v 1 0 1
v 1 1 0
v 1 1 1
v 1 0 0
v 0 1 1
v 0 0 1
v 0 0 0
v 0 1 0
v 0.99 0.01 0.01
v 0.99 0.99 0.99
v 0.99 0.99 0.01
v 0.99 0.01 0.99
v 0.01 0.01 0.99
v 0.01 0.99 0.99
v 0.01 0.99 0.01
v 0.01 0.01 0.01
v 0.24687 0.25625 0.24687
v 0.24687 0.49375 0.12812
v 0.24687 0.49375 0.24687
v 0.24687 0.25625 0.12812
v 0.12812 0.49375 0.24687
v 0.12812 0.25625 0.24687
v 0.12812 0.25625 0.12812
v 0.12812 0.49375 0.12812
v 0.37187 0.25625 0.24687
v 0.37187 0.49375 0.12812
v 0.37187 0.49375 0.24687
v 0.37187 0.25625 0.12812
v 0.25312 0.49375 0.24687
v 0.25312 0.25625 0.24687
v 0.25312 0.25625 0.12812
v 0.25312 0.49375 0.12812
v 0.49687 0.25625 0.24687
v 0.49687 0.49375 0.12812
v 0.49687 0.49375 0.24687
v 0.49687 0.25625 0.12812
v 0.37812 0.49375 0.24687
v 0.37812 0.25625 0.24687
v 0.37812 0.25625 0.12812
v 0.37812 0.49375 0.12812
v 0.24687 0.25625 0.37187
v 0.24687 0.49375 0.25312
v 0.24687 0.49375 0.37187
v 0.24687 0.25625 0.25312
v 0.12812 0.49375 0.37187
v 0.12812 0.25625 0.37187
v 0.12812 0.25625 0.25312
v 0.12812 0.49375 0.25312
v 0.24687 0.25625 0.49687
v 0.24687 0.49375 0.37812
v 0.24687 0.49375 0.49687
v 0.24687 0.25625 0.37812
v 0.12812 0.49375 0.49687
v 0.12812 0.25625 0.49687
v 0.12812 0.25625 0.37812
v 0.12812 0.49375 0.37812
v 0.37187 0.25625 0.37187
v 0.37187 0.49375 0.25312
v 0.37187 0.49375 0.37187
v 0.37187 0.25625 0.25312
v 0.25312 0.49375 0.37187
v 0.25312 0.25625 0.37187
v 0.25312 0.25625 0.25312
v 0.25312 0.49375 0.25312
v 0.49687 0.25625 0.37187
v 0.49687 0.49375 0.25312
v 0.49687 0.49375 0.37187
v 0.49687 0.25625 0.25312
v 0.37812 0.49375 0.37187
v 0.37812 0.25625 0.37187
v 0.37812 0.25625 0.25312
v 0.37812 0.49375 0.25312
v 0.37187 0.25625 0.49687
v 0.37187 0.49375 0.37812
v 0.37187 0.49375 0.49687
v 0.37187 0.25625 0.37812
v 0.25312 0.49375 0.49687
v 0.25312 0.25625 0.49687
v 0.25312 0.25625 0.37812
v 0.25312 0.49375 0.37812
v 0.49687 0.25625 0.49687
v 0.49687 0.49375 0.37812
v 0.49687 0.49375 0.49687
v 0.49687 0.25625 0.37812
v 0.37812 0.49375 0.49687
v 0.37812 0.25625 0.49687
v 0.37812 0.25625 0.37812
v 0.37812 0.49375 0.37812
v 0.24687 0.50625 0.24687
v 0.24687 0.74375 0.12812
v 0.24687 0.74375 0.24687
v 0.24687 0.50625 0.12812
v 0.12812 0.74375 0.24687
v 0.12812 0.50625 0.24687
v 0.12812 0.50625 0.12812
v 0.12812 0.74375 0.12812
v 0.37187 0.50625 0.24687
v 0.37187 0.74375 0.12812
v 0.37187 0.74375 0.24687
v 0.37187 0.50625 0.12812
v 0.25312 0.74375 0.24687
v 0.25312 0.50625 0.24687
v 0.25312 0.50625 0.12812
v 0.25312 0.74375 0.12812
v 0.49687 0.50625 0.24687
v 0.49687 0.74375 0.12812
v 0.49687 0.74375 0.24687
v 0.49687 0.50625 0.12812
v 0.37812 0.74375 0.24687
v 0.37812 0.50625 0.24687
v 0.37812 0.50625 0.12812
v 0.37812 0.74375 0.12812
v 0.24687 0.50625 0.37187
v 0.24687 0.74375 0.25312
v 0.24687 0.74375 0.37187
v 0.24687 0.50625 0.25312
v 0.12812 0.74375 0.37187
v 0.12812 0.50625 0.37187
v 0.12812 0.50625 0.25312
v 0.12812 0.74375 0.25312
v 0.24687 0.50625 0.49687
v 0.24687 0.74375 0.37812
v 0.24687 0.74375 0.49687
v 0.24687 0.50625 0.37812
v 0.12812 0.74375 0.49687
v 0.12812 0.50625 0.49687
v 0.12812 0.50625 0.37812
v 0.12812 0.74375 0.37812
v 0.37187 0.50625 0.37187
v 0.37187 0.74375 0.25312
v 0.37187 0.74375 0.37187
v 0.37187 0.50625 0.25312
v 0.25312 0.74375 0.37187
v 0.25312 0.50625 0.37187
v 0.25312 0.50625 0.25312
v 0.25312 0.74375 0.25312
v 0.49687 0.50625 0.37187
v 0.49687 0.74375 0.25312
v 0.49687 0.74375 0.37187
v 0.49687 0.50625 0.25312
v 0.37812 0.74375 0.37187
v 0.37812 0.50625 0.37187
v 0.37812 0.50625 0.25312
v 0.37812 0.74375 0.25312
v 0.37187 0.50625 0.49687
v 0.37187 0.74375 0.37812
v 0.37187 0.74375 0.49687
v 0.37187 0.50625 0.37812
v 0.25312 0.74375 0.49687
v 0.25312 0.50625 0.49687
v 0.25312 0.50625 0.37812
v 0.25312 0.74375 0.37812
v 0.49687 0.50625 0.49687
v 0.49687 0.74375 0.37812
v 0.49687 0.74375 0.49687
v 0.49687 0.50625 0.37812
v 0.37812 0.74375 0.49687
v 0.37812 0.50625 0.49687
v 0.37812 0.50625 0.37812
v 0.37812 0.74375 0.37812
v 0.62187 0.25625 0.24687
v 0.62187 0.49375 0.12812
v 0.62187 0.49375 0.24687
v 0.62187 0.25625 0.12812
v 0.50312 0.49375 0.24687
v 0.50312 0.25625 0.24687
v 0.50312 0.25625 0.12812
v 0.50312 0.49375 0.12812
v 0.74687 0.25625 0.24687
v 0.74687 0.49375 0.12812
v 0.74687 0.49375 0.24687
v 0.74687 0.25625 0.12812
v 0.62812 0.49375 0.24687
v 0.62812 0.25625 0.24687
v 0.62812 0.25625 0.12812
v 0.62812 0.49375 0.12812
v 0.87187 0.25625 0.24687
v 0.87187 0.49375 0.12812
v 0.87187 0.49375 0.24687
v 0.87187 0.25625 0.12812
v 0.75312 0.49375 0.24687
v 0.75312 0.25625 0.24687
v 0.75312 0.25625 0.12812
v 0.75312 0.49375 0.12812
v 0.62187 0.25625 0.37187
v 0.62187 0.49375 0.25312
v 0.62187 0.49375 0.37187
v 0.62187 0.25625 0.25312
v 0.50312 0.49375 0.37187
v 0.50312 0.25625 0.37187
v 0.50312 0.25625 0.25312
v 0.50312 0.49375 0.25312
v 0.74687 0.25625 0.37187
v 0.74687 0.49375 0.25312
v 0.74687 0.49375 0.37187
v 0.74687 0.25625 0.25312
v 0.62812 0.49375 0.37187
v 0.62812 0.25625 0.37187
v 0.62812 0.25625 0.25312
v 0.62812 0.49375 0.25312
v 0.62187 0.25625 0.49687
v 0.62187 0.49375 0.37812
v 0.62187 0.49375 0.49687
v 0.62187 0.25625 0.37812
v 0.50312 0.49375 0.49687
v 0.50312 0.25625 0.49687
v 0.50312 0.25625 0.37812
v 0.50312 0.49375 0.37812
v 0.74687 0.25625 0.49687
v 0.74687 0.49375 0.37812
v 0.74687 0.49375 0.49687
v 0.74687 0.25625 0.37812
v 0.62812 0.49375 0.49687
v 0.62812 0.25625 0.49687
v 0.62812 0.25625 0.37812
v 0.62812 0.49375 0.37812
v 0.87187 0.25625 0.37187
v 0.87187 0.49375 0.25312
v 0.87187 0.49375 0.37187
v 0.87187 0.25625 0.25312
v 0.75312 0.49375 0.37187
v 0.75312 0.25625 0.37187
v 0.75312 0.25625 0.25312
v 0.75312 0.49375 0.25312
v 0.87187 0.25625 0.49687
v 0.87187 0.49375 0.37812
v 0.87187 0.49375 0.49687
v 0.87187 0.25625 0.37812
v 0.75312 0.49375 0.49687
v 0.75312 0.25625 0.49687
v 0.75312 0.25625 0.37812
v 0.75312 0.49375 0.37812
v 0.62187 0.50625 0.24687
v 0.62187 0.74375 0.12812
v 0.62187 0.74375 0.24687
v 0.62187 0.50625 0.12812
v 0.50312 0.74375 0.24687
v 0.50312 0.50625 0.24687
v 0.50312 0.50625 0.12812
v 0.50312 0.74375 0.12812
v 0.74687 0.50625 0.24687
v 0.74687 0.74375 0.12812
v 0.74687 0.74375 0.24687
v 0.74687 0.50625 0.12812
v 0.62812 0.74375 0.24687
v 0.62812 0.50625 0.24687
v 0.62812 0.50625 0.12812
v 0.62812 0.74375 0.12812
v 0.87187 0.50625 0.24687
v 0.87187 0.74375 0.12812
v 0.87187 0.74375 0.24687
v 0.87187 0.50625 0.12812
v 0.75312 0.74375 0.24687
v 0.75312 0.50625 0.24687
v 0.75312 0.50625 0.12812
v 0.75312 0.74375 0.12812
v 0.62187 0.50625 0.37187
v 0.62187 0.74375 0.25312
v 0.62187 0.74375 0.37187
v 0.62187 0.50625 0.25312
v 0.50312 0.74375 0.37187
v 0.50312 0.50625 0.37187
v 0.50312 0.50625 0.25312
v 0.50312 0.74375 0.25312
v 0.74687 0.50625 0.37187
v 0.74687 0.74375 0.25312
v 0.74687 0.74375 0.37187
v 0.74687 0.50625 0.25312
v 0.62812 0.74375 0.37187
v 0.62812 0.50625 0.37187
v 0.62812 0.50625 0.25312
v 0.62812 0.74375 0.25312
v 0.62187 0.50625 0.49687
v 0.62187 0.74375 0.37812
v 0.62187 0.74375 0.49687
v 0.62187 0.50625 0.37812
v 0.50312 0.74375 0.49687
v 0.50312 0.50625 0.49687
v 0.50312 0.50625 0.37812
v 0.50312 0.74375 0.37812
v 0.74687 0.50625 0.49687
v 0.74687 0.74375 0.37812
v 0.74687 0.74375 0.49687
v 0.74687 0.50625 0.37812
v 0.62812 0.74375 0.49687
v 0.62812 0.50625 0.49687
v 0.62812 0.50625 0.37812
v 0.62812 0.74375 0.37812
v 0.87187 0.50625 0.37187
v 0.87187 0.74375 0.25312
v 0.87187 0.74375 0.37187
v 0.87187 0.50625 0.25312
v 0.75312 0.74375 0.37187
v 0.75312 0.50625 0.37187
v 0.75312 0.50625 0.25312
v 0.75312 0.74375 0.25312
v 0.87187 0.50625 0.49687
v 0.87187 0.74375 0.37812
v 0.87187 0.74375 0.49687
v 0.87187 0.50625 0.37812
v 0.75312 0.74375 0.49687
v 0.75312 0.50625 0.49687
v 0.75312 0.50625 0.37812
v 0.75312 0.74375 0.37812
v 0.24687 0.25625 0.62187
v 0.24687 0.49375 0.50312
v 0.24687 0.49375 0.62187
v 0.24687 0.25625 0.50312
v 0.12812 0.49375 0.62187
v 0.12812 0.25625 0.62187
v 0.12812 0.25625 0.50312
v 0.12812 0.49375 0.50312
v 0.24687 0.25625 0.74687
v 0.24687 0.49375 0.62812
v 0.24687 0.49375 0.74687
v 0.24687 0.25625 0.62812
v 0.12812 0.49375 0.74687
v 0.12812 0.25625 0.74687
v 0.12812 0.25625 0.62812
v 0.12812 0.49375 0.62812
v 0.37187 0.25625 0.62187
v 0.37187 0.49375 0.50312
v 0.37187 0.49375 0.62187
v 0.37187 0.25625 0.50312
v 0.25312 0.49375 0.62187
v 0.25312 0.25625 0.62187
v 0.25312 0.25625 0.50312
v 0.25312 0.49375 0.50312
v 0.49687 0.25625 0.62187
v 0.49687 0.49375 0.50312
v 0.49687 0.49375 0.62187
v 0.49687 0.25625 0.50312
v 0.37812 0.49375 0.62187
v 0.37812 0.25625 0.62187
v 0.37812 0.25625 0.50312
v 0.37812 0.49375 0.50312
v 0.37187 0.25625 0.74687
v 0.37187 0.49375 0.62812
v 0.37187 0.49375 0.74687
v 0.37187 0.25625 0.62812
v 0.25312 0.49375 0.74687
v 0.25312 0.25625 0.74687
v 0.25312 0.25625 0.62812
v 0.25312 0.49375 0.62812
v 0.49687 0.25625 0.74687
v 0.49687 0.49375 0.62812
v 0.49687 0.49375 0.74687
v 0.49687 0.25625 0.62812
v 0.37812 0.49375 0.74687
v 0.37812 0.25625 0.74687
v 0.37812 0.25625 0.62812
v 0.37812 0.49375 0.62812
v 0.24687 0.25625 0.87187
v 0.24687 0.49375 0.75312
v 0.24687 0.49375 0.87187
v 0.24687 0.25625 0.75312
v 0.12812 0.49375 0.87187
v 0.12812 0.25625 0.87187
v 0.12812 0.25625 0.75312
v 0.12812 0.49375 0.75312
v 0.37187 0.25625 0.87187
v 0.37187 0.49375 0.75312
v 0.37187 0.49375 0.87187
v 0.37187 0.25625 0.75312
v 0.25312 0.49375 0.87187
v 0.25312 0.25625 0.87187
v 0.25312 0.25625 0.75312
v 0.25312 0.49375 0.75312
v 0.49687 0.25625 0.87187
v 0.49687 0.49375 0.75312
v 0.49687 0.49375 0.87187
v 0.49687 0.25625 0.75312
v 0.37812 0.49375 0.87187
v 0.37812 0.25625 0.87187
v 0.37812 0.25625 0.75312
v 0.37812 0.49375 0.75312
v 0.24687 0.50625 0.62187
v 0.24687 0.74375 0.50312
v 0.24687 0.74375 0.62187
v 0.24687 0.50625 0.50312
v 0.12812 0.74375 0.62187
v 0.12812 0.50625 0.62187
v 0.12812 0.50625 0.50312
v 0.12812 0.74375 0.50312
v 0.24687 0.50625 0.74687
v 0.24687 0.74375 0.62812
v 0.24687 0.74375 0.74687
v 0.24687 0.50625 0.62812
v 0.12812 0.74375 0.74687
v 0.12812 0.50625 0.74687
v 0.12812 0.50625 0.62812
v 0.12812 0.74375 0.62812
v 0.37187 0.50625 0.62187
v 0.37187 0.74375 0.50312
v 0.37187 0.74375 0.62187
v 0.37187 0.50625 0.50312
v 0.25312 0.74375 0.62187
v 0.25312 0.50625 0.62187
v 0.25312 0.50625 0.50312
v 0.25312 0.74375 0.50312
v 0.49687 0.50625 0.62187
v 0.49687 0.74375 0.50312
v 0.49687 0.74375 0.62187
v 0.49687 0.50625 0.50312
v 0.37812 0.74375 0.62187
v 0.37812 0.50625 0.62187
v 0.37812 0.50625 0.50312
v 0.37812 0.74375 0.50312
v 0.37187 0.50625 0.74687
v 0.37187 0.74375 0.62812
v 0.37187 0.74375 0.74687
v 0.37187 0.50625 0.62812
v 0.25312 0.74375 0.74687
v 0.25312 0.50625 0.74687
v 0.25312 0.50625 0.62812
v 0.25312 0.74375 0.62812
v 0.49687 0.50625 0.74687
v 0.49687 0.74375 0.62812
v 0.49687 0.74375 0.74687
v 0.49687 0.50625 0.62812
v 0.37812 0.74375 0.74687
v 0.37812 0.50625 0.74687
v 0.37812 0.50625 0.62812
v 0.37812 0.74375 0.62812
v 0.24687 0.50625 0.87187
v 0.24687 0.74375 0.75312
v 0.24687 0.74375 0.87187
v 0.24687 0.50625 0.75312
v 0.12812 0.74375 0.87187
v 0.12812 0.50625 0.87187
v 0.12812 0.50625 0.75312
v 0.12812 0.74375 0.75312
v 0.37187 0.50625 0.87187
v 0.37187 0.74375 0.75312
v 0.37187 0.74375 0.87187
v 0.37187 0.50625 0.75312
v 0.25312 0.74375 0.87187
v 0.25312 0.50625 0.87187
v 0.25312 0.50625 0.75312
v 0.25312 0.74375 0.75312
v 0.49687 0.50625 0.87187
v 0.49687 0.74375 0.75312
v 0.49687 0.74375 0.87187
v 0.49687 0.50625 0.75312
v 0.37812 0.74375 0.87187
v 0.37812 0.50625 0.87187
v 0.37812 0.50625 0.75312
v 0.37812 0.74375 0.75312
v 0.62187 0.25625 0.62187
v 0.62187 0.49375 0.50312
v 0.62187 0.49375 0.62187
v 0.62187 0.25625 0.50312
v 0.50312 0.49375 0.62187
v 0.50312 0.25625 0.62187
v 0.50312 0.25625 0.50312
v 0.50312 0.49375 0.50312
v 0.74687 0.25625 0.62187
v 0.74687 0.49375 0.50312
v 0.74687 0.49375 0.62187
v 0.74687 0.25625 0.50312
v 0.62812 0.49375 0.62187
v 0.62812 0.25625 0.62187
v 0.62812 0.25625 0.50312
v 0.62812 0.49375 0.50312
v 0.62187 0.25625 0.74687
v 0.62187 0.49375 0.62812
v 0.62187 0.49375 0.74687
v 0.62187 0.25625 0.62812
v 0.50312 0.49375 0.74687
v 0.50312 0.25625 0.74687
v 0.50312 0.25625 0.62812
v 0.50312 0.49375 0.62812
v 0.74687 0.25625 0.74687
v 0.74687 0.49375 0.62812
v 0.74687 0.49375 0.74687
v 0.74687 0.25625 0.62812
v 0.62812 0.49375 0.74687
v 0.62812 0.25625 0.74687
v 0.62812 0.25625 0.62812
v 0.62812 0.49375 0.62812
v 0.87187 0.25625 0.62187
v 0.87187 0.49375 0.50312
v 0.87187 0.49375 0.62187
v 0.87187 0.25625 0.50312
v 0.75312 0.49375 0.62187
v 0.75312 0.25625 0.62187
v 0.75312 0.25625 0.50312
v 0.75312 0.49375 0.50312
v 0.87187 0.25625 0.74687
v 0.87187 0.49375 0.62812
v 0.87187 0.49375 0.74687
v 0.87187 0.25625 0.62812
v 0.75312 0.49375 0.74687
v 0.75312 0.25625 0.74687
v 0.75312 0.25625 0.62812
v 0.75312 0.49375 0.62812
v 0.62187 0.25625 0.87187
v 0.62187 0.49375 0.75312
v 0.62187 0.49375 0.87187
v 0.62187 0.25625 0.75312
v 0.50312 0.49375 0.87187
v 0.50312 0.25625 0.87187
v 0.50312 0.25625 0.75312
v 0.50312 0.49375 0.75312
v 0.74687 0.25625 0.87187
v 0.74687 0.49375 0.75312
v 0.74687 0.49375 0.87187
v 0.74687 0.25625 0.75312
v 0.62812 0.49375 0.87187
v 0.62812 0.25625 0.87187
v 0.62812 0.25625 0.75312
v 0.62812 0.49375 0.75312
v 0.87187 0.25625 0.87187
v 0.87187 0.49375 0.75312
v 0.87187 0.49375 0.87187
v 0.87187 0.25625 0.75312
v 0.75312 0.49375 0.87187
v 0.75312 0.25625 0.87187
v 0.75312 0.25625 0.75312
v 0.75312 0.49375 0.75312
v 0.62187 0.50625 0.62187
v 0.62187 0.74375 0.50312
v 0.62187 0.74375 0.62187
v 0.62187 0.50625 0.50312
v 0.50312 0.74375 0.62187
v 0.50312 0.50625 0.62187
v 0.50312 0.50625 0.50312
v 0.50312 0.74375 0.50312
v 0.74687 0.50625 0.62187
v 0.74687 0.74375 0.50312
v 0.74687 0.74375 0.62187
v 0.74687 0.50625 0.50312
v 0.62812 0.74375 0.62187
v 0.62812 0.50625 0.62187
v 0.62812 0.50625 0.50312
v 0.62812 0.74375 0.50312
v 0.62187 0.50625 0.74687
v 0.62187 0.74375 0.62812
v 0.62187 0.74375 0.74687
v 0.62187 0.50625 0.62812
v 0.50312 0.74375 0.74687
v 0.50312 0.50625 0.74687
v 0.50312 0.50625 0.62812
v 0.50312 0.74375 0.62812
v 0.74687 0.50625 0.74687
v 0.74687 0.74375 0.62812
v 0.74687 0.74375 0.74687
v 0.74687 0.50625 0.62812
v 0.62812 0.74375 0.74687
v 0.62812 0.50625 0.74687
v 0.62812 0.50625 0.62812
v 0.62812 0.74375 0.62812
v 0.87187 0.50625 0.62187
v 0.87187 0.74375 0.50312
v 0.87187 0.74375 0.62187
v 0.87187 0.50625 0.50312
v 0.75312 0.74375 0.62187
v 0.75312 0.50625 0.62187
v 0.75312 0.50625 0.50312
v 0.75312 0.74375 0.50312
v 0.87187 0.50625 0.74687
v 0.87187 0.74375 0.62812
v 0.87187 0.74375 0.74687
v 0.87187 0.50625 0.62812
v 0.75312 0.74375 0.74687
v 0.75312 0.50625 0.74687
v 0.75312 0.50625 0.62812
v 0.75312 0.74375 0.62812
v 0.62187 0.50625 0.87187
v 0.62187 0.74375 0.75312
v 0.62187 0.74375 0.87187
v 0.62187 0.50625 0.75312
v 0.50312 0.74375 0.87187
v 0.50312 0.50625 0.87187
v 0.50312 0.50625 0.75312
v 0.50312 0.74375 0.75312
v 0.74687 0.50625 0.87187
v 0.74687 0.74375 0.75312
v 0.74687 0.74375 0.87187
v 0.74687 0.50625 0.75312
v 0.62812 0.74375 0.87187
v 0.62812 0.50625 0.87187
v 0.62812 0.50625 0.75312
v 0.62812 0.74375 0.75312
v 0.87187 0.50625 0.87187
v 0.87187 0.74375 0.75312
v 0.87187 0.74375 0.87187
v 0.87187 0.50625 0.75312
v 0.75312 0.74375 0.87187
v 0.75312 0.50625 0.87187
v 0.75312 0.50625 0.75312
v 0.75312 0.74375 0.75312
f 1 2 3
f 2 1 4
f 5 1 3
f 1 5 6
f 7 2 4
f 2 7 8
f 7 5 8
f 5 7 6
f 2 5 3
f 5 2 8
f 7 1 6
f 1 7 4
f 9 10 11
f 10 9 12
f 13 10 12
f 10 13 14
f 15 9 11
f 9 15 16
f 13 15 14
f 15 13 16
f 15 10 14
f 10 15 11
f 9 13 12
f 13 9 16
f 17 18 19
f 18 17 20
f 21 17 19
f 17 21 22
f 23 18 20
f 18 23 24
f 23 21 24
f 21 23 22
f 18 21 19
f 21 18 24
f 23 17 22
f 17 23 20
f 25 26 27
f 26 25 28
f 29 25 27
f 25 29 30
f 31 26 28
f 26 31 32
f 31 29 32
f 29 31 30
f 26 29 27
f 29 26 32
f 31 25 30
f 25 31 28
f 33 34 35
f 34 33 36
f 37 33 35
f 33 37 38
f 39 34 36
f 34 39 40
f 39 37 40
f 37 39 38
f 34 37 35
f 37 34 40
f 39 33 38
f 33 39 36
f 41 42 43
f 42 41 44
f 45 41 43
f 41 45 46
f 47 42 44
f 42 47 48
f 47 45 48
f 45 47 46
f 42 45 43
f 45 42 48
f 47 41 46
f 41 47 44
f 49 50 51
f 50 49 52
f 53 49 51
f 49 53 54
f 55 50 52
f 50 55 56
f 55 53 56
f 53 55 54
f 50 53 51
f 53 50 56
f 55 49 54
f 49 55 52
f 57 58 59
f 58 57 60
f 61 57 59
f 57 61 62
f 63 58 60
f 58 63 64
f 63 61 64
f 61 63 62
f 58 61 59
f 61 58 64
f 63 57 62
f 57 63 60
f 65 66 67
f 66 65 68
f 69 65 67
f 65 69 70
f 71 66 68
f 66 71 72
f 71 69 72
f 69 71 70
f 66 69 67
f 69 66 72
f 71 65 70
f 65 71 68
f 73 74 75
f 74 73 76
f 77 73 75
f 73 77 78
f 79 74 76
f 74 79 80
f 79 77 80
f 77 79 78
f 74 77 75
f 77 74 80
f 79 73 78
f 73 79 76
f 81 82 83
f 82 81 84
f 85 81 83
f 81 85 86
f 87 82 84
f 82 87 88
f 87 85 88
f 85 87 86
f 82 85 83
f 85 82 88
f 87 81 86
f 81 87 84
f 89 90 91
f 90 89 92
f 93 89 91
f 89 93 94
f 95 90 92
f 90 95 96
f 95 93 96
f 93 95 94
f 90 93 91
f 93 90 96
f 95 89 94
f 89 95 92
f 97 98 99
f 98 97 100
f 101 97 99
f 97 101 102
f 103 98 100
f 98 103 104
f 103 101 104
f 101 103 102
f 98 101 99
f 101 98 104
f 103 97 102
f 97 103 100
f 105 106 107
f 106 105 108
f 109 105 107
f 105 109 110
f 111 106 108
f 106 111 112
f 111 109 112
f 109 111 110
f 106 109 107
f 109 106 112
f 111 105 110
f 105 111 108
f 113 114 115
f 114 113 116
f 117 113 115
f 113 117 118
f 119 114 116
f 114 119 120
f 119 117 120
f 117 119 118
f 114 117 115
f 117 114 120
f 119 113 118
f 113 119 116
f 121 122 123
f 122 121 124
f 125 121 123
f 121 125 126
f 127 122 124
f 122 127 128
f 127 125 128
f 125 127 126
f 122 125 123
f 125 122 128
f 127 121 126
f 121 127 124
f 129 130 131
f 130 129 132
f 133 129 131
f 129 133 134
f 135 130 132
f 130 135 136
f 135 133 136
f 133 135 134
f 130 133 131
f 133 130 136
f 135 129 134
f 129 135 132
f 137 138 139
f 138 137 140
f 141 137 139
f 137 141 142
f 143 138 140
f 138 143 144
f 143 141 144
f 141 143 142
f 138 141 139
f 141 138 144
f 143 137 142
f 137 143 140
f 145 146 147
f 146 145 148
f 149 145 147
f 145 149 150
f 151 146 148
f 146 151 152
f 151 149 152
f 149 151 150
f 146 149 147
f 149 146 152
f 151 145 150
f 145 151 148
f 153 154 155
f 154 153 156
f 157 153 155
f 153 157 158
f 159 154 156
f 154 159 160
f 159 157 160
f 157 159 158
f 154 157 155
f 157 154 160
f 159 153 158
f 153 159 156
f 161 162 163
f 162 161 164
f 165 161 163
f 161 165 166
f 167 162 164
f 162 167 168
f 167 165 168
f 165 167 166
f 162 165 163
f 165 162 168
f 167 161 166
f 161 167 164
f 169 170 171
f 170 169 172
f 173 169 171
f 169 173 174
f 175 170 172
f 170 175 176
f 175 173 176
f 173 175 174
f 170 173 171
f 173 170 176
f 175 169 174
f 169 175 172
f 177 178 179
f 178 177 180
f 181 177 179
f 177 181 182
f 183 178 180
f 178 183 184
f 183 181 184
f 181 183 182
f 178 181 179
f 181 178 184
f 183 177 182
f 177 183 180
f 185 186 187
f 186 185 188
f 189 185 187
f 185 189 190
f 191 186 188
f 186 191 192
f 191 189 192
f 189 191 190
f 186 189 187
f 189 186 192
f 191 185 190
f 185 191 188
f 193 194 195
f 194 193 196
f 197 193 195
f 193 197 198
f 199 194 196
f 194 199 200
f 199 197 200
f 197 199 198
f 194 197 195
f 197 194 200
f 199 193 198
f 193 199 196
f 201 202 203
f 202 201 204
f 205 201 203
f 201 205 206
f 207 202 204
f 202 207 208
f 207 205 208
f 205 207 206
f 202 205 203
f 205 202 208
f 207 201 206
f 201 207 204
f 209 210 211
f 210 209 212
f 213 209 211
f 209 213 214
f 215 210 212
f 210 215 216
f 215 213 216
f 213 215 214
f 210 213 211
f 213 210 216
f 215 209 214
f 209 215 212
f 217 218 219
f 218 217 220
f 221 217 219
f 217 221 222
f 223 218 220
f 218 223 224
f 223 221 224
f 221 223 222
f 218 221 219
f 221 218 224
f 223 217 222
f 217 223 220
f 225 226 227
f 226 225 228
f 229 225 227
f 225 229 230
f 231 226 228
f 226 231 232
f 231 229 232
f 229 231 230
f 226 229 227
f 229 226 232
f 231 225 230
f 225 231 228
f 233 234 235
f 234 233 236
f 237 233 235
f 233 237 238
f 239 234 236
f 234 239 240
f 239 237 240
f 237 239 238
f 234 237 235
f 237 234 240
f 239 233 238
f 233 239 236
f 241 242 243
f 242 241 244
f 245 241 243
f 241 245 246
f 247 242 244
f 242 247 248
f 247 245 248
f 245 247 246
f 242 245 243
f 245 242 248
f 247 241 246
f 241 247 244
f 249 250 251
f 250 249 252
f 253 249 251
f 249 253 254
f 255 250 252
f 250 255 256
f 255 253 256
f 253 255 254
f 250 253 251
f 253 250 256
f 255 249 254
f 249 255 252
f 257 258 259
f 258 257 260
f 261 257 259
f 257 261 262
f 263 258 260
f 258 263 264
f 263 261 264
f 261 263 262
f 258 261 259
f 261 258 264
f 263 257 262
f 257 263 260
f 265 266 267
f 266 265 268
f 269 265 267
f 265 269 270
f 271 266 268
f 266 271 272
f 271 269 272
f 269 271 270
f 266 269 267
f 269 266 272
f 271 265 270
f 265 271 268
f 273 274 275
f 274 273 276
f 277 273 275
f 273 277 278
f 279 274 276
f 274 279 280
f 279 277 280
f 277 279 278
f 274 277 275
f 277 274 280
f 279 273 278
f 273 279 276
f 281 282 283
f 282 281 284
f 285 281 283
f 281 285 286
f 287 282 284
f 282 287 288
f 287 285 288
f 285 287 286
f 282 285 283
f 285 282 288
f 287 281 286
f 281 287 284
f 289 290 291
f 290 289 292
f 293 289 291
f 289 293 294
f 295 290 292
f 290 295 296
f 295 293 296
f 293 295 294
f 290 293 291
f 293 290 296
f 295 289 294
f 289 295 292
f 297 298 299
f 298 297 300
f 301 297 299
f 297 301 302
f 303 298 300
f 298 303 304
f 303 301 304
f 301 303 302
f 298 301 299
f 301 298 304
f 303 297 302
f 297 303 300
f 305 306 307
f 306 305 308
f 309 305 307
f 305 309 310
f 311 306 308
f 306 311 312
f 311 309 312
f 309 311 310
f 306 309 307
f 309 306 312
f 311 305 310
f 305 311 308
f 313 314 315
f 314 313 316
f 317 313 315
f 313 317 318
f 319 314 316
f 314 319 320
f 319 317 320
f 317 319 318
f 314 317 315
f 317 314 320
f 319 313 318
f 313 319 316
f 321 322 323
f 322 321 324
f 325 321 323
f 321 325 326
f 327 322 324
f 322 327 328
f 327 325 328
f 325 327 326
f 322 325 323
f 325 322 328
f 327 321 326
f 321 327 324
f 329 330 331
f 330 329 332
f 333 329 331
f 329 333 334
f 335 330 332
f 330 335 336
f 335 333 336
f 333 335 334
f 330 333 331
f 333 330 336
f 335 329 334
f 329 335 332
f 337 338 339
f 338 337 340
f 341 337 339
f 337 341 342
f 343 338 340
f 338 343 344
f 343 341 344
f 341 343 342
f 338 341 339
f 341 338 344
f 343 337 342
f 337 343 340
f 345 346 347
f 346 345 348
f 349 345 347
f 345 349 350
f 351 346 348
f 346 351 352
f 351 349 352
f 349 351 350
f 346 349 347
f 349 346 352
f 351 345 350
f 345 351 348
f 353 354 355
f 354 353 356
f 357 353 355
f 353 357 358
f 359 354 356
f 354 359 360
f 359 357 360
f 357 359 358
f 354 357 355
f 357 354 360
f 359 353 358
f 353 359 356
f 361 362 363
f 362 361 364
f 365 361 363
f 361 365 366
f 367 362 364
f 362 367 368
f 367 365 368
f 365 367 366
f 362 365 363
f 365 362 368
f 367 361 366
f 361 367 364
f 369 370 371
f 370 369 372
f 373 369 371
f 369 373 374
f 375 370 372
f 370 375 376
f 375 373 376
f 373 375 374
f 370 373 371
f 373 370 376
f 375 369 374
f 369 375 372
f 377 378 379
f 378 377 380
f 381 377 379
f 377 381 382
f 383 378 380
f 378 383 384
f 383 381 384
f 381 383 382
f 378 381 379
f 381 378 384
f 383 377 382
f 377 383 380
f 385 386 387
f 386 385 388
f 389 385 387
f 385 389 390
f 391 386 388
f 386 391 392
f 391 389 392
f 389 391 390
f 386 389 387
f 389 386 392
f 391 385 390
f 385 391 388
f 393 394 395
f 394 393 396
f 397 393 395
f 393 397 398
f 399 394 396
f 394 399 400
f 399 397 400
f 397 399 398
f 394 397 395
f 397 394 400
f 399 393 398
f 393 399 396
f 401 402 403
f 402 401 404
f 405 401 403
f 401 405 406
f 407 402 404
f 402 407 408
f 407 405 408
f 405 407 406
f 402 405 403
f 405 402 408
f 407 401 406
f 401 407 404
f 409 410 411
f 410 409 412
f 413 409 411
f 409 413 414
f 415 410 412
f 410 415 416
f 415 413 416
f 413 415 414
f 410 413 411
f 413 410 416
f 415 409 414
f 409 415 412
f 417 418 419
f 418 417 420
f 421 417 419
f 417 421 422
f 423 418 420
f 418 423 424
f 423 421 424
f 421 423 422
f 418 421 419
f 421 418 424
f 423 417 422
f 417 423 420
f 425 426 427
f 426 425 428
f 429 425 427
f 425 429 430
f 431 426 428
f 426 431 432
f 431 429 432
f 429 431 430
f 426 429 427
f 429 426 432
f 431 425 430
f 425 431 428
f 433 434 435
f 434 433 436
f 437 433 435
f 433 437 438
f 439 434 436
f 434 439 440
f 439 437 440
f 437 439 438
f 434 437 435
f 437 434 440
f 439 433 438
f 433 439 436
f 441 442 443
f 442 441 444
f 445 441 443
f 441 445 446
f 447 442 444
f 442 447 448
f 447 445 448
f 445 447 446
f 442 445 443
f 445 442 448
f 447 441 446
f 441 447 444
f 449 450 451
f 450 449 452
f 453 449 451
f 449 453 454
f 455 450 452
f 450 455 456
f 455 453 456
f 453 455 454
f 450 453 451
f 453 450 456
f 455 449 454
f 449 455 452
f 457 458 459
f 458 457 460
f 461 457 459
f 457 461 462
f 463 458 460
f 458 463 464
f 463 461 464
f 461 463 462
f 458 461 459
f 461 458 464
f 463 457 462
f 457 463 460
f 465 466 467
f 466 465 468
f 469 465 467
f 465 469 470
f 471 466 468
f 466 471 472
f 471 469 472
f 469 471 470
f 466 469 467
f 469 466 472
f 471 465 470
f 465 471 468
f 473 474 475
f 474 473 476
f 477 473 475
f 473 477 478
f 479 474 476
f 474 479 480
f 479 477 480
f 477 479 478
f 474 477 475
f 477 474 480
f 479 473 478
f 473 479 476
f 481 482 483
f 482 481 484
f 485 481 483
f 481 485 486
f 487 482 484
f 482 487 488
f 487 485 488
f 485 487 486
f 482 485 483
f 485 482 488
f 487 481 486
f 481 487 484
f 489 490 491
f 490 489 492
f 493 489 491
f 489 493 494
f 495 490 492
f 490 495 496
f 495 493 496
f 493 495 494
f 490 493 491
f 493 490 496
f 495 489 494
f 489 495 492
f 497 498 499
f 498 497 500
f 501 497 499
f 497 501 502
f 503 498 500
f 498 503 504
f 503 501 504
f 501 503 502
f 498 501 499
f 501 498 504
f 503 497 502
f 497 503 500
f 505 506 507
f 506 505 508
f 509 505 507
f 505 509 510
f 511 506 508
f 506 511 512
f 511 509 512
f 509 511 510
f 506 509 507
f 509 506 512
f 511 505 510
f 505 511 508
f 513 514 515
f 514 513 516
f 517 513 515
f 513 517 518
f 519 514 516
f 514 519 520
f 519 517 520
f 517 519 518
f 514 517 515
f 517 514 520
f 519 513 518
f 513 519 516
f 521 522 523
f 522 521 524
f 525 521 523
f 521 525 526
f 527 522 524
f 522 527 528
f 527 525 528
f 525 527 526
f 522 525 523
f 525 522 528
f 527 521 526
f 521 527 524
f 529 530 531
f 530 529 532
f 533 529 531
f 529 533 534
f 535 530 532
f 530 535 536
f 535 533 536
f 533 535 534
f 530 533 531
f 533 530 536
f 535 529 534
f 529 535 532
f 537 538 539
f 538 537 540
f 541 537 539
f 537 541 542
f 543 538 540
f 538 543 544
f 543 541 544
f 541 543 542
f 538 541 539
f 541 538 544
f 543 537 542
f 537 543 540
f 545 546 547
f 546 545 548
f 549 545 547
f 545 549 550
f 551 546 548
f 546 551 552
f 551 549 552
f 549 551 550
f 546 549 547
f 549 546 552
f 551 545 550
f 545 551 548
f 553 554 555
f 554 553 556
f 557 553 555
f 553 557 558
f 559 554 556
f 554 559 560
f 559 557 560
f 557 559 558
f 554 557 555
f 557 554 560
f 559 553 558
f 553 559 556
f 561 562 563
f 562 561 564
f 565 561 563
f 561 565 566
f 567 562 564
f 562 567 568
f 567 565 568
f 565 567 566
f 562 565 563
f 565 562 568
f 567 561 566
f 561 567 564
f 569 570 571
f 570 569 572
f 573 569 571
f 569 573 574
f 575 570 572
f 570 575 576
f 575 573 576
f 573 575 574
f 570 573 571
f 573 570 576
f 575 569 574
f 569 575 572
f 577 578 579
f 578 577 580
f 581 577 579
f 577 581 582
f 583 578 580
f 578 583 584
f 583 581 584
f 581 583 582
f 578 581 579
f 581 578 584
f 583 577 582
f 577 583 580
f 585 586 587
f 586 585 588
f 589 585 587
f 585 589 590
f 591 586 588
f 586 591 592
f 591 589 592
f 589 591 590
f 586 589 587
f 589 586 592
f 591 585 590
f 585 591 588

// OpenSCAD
translate([0.1875, 0.375, 0.1875]) color([0.4027663718100136, 0.6577212462700855, 0.6898864362311222]) cube([0.11875, 0.2375, 0.11875], center=true);
translate([0.3125, 0.375, 0.1875]) color([0.9054447882857072, 0.7509014738189853, 0.1895263609282205]) cube([0.11875, 0.2375, 0.11875], center=true);
translate([0.4375, 0.375, 0.1875]) color([0.45596485047959523, 0.8783351779475488, 0.4538518730840495]) cube([0.11875, 0.2375, 0.11875], center=true);
translate([0.1875, 0.375, 0.3125]) color([0.392660976888327, 0.856988482484495, 0.6201647902220953]) cube([0.11875, 0.2375, 0.11875], center=true);
translate([0.1875, 0.375, 0.4375]) color([0.29061826466264573, 0.962227894906525, 0.8675314723906767]) cube([0.11875, 0.2375, 0.11875], center=true);
translate([0.3125, 0.375, 0.3125]) color([0.8803060724684076, 0.8138480179101812, 0.7400092052970599]) cube([0.11875, 0.2375, 0.11875], center=true);
translate([0.4375, 0.375, 0.3125]) color([0.5394445544845855, 0.5760594201823124, 0.5958853169652069]) cube([0.11875, 0.2375, 0.11875], center=true);
translate([0.3125, 0.375, 0.4375]) color([0.9765395534020428, 0.1829668899751793, 0.7537025803929293]) cube([0.11875, 0.2375, 0.11875], center=true);
translate([0.4375, 0.375, 0.4375]) color([0.6030052593528492, 0.2876412521642051, 0.6348976512769944]) cube([0.11875, 0.2375, 0.11875], center=true);
translate([0.1875, 0.625, 0.1875]) color([0.7277197744124063, 0.35444110935932793, 0.13099720777835244]) cube([0.11875, 0.2375, 0.11875], center=true);
translate([0.3125, 0.625, 0.1875]) color([0.4028586833174501, 0.6909489908116095, 0.5046977059005883]) cube([0.11875, 0.2375, 0.11875], center=true);
translate([0.4375, 0.625, 0.1875]) color([0.9629492600241728, 0.26191874219651334, 0.04834033943485738]) cube([0.11875, 0.2375, 0.11875], center=true);
translate([0.1875, 0.625, 0.3125]) color([0.45923032237186845, 0.009528131294201714, 0.502466895235334]) cube([0.11875, 0.2375, 0.11875], center=true);
translate([0.1875, 0.625, 0.4375]) color([0.28668854888236694, 0.691988813393134, 0.7039243500182285]) cube([0.11875, 0.2375, 0.11875], center=true);
translate([0.3125, 0.625, 0.3125]) color([0.6909228597729594, 0.6425067308098993, 0.8260971072391406]) cube([0.11875, 0.2375, 0.11875], center=true);
translate([0.4375, 0.625, 0.3125]) color([0.9493344595797667, 0.3534564548141357, 0.5797180935726473]) cube([0.11875, 0.2375, 0.11875], center=true);
translate([0.3125, 0.625, 0.4375]) color([0.7810705573282835, 0.2844853183364905, 0.2538937908972332]) cube([0.11875, 0.2375, 0.11875], center=true);
translate([0.4375, 0.625, 0.4375]) color([0.5787285323695237, 0.11539312184696959, 0.8023856460035432]) cube([0.11875, 0.2375, 0.11875], center=true);
translate([0.5625, 0.375, 0.1875]) color([0.21861457317165833, 0.8676945440438885, 0.5076736037058898]) cube([0.11875, 0.2375, 0.11875], center=true);
translate([0.6875, 0.375, 0.1875]) color([0.7138499686467532, 0.22713272906273496, 0.19390251356413268]) cube([0.11875, 0.2375, 0.11875], center=true);
translate([0.8125, 0.375, 0.1875]) color([0.8240740032726942, 0.6733086943972952, 0.42782145262094673]) cube([0.11875, 0.2375, 0.11875], center=true);
translate([0.5625, 0.375, 0.3125]) color([0.8852650888181466, 0.06739856337172401, 0.6884111402324574]) cube([0.11875, 0.2375, 0.11875], center=true);
translate([0.6875, 0.375, 0.3125]) color([0.9973030967892196, 0.7409370940146432, 0.06492133544831458]) cube([0.11875, 0.2375, 0.11875], center=true);
translate([0.5625, 0.375, 0.4375]) color([0.7942364824350366, 0.3053909315102985, 0.8216686663682834]) cube([0.11875, 0.2375, 0.11875], center=true);
translate([0.6875, 0.375, 0.4375]) color([0.8459339369028931, 0.10292352286401718, 0.3596183375652757]) cube([0.11875, 0.2375, 0.11875], center=true);
translate([0.8125, 0.375, 0.3125]) color([0.09283318422206643, 0.1574888597405516, 0.05329512929812119]) cube([0.11875, 0.2375, 0.11875], center=true);
translate([0.8125, 0.375, 0.4375]) color([0.2699146760255431, 0.04789901746797298, 0.5311955905083697]) cube([0.11875, 0.2375, 0.11875], center=true);
translate([0.5625, 0.625, 0.1875]) color([0.6347236326985357, 0.22194381133175534, 0.7589835239916253]) cube([0.11875, 0.2375, 0.11875], center=true);
translate([0.6875, 0.625, 0.1875]) color([0.6022590362463128, 0.030652426287076096, 0.2834486040351434]) cube([0.11875, 0.2375, 0.11875], center=true);
translate([0.8125, 0.625, 0.1875]) color([0.1619511803560364, 0.5865516376320478, 0.8828126406174278]) cube([0.11875, 0.2375, 0.11875], center=true);
translate([0.5625, 0.625, 0.3125]) color([0.39153967851812266, 0.7185326387678173, 0.23053015786512054]) cube([0.11875, 0.2375, 0.11875], center=true);
translate([0.6875, 0.625, 0.3125]) color([0.982870030008995, 0.9702944368690501, 0.24195708671592953]) cube([0.11875, 0.2375, 0.11875], center=true);
translate([0.5625, 0.625, 0.4375]) color([0.704495028087497, 0.5155786783081866, 0.561419053309271]) cube([0.11875, 0.2375, 0.11875], center=true);
translate([0.6875, 0.625, 0.4375]) color([0.5923741296225379, 0.9857567098878326, 0.9164117351002967]) cube([0.11875, 0.2375, 0.11875], center=true);
translate([0.8125, 0.625, 0.3125]) color([0.8116019260161097, 0.5883866289782574, 0.33879660324831606]) cube([0.11875, 0.2375, 0.11875], center=true);
translate([0.8125, 0.625, 0.4375]) color([0.8056081572624008, 0.6883259942275256, 0.6442271513792995]) cube([0.11875, 0.2375, 0.11875], center=true);
translate([0.1875, 0.375, 0.5625]) color([0.8431767362036547, 0.8108980259618639, 0.6405391435643338]) cube([0.11875, 0.2375, 0.11875], center=true);
translate([0.1875, 0.375, 0.6875]) color([0.685920749167404, 0.2509693260364446, 0.15500232486790055]) cube([0.11875, 0.2375, 0.11875], center=true);
translate([0.3125, 0.375, 0.5625]) color([0.46926577374890555, 0.16609469683297173, 0.4224585519841333]) cube([0.11875, 0.2375, 0.11875], center=true);
translate([0.4375, 0.375, 0.5625]) color([0.2490168900491534, 0.40880502569295185, 0.012419103072644377]) cube([0.11875, 0.2375, 0.11875], center=true);
translate([0.3125, 0.375, 0.6875]) color([0.025875812278519095, 0.7873495565870041, 0.9759359006867971]) cube([0.11875, 0.2375, 0.11875], center=true);
translate([0.4375, 0.375, 0.6875]) color([0.04370132643842428, 0.0680748917335321, 0.10993484573778345]) cube([0.11875, 0.2375, 0.11875], center=true);
translate([0.1875, 0.375, 0.8125]) color([0.025440652526324325, 0.35930918769587816, 0.6576834209110304]) cube([0.11875, 0.2375, 0.11875], center=true);
translate([0.3125, 0.375, 0.8125]) color([0.45738792513705007, 0.11050016433501875, 0.16934144419549657]) cube([0.11875, 0.2375, 0.11875], center=true);
translate([0.4375, 0.375, 0.8125]) color([0.9823307052955691, 0.015371616596600357, 0.5469958681368476]) cube([0.11875, 0.2375, 0.11875], center=true);
translate([0.1875, 0.625, 0.5625]) color([0.4481673411531317, 0.39564673043400334, 0.44744174271207393]) cube([0.11875, 0.2375, 0.11875], center=true);
translate([0.1875, 0.625, 0.6875]) color([0.3106677936568867, 0.3766875312075597, 0.009943036678915051]) cube([0.11875, 0.2375, 0.11875], center=true);
translate([0.3125, 0.625, 0.5625]) color([0.8046224172925958, 0.7233221347071627, 0.19392130886028047]) cube([0.11875, 0.2375, 0.11875], center=true);
translate([0.4375, 0.625, 0.5625]) color([0.9413761554583167, 0.9142522916408691, 0.9310579136654714]) cube([0.11875, 0.2375, 0.11875], center=true);
translate([0.3125, 0.625, 0.6875]) color([0.6802882974641905, 0.7990984174551553, 0.09098081043969186]) cube([0.11875, 0.2375, 0.11875], center=true);
translate([0.4375, 0.625, 0.6875]) color([0.5656086486770056, 0.6877421682660309, 0.138938110548806]) cube([0.11875, 0.2375, 0.11875], center=true);
translate([0.1875, 0.625, 0.8125]) color([0.29336974906310864, 0.6344499261654525, 0.007999852367574833]) cube([0.11875, 0.2375, 0.11875], center=true);
translate([0.3125, 0.625, 0.8125]) color([0.567710247486508, 0.16900259692486608, 0.4497244963009409]) cube([0.11875, 0.2375, 0.11875], center=true);
translate([0.4375, 0.625, 0.8125]) color([0.19349089130243502, 0.1376578383864322, 0.9098341634584806]) cube([0.11875, 0.2375, 0.11875], center=true);
translate([0.5625, 0.375, 0.5625]) color([0.9940770824034855, 0.5163757249915497, 0.7308804323545407]) cube([0.11875, 0.2375, 0.11875], center=true);
translate([0.6875, 0.375, 0.5625]) color([0.40120095441214165, 0.2637084662905643, 0.8309811505098555]) cube([0.11875, 0.2375, 0.11875], center=true);
translate([0.5625, 0.375, 0.6875]) color([0.8954038347920629, 0.029263267364950774, 0.8712617879291955]) cube([0.11875, 0.2375, 0.11875], center=true);
translate([0.6875, 0.375, 0.6875]) color([0.7807691496852602, 0.3927544303006748, 0.23132480502098685]) cube([0.11875, 0.2375, 0.11875], center=true);
translate([0.8125, 0.375, 0.5625]) color([0.5881136606211171, 0.7212506560246387, 0.680095944190379]) cube([0.11875, 0.2375, 0.11875], center=true);
translate([0.8125, 0.375, 0.6875]) color([0.08490285586017154, 0.14066903496669403, 0.7796529180048677]) cube([0.11875, 0.2375, 0.11875], center=true);
translate([0.5625, 0.375, 0.8125]) color([0.7835004915809534, 0.14403242626677604, 0.6205944311996918]) cube([0.11875, 0.2375, 0.11875], center=true);
translate([0.6875, 0.375, 0.8125]) color([0.9860198240801327, 0.7463620192530275, 0.12328924539830444]) cube([0.11875, 0.2375, 0.11875], center=true);
translate([0.8125, 0.375, 0.8125]) color([0.3934845856449162, 0.22190636083031767, 0.42579848001892817]) cube([0.11875, 0.2375, 0.11875], center=true);
translate([0.5625, 0.625, 0.5625]) color([0.8421059395496058, 0.7013921595809985, 0.18594414823963568]) cube([0.11875, 0.2375, 0.11875], center=true);
translate([0.6875, 0.625, 0.5625]) color([0.535050645310248, 0.04806727715001191, 0.171929907822313]) cube([0.11875, 0.2375, 0.11875], center=true);
translate([0.5625, 0.625, 0.6875]) color([0.9667145599986504, 0.31915058984929434, 0.7332438065185747]) cube([0.11875, 0.2375, 0.11875], center=true);
translate([0.6875, 0.625, 0.6875]) color([0.7024119987370756, 0.4668515608388659, 0.6460826751271115]) cube([0.11875, 0.2375, 0.11875], center=true);
translate([0.8125, 0.625, 0.5625]) color([0.44788911113578045, 0.6306504768816465, 0.853602017606074]) cube([0.11875, 0.2375, 0.11875], center=true);
translate([0.8125, 0.625, 0.6875]) color([0.6690458871548646, 0.1740623608628068, 0.2105608729479982]) cube([0.11875, 0.2375, 0.11875], center=true);
translate([0.5625, 0.625, 0.8125]) color([0.5027670546539844, 0.9629075911793253, 0.7823123539910526]) cube([0.11875, 0.2375, 0.11875], center=true);
translate([0.6875, 0.625, 0.8125]) color([0.16050605428948317, 0.5676968792065807, 0.45876216119939184]) cube([0.11875, 0.2375, 0.11875], center=true);
translate([0.8125, 0.625, 0.8125]) color([0.15824250225529835, 0.43638160731444176, 0.8002138144933295]) cube([0.11875, 0.2375, 0.11875], center=true);
color([0.3,0.3,0.3,0.3]) difference() { cube([1,1,1]); translate([0.01,0.01,0.01]) cube([0.98,0.98,0.98]); }
